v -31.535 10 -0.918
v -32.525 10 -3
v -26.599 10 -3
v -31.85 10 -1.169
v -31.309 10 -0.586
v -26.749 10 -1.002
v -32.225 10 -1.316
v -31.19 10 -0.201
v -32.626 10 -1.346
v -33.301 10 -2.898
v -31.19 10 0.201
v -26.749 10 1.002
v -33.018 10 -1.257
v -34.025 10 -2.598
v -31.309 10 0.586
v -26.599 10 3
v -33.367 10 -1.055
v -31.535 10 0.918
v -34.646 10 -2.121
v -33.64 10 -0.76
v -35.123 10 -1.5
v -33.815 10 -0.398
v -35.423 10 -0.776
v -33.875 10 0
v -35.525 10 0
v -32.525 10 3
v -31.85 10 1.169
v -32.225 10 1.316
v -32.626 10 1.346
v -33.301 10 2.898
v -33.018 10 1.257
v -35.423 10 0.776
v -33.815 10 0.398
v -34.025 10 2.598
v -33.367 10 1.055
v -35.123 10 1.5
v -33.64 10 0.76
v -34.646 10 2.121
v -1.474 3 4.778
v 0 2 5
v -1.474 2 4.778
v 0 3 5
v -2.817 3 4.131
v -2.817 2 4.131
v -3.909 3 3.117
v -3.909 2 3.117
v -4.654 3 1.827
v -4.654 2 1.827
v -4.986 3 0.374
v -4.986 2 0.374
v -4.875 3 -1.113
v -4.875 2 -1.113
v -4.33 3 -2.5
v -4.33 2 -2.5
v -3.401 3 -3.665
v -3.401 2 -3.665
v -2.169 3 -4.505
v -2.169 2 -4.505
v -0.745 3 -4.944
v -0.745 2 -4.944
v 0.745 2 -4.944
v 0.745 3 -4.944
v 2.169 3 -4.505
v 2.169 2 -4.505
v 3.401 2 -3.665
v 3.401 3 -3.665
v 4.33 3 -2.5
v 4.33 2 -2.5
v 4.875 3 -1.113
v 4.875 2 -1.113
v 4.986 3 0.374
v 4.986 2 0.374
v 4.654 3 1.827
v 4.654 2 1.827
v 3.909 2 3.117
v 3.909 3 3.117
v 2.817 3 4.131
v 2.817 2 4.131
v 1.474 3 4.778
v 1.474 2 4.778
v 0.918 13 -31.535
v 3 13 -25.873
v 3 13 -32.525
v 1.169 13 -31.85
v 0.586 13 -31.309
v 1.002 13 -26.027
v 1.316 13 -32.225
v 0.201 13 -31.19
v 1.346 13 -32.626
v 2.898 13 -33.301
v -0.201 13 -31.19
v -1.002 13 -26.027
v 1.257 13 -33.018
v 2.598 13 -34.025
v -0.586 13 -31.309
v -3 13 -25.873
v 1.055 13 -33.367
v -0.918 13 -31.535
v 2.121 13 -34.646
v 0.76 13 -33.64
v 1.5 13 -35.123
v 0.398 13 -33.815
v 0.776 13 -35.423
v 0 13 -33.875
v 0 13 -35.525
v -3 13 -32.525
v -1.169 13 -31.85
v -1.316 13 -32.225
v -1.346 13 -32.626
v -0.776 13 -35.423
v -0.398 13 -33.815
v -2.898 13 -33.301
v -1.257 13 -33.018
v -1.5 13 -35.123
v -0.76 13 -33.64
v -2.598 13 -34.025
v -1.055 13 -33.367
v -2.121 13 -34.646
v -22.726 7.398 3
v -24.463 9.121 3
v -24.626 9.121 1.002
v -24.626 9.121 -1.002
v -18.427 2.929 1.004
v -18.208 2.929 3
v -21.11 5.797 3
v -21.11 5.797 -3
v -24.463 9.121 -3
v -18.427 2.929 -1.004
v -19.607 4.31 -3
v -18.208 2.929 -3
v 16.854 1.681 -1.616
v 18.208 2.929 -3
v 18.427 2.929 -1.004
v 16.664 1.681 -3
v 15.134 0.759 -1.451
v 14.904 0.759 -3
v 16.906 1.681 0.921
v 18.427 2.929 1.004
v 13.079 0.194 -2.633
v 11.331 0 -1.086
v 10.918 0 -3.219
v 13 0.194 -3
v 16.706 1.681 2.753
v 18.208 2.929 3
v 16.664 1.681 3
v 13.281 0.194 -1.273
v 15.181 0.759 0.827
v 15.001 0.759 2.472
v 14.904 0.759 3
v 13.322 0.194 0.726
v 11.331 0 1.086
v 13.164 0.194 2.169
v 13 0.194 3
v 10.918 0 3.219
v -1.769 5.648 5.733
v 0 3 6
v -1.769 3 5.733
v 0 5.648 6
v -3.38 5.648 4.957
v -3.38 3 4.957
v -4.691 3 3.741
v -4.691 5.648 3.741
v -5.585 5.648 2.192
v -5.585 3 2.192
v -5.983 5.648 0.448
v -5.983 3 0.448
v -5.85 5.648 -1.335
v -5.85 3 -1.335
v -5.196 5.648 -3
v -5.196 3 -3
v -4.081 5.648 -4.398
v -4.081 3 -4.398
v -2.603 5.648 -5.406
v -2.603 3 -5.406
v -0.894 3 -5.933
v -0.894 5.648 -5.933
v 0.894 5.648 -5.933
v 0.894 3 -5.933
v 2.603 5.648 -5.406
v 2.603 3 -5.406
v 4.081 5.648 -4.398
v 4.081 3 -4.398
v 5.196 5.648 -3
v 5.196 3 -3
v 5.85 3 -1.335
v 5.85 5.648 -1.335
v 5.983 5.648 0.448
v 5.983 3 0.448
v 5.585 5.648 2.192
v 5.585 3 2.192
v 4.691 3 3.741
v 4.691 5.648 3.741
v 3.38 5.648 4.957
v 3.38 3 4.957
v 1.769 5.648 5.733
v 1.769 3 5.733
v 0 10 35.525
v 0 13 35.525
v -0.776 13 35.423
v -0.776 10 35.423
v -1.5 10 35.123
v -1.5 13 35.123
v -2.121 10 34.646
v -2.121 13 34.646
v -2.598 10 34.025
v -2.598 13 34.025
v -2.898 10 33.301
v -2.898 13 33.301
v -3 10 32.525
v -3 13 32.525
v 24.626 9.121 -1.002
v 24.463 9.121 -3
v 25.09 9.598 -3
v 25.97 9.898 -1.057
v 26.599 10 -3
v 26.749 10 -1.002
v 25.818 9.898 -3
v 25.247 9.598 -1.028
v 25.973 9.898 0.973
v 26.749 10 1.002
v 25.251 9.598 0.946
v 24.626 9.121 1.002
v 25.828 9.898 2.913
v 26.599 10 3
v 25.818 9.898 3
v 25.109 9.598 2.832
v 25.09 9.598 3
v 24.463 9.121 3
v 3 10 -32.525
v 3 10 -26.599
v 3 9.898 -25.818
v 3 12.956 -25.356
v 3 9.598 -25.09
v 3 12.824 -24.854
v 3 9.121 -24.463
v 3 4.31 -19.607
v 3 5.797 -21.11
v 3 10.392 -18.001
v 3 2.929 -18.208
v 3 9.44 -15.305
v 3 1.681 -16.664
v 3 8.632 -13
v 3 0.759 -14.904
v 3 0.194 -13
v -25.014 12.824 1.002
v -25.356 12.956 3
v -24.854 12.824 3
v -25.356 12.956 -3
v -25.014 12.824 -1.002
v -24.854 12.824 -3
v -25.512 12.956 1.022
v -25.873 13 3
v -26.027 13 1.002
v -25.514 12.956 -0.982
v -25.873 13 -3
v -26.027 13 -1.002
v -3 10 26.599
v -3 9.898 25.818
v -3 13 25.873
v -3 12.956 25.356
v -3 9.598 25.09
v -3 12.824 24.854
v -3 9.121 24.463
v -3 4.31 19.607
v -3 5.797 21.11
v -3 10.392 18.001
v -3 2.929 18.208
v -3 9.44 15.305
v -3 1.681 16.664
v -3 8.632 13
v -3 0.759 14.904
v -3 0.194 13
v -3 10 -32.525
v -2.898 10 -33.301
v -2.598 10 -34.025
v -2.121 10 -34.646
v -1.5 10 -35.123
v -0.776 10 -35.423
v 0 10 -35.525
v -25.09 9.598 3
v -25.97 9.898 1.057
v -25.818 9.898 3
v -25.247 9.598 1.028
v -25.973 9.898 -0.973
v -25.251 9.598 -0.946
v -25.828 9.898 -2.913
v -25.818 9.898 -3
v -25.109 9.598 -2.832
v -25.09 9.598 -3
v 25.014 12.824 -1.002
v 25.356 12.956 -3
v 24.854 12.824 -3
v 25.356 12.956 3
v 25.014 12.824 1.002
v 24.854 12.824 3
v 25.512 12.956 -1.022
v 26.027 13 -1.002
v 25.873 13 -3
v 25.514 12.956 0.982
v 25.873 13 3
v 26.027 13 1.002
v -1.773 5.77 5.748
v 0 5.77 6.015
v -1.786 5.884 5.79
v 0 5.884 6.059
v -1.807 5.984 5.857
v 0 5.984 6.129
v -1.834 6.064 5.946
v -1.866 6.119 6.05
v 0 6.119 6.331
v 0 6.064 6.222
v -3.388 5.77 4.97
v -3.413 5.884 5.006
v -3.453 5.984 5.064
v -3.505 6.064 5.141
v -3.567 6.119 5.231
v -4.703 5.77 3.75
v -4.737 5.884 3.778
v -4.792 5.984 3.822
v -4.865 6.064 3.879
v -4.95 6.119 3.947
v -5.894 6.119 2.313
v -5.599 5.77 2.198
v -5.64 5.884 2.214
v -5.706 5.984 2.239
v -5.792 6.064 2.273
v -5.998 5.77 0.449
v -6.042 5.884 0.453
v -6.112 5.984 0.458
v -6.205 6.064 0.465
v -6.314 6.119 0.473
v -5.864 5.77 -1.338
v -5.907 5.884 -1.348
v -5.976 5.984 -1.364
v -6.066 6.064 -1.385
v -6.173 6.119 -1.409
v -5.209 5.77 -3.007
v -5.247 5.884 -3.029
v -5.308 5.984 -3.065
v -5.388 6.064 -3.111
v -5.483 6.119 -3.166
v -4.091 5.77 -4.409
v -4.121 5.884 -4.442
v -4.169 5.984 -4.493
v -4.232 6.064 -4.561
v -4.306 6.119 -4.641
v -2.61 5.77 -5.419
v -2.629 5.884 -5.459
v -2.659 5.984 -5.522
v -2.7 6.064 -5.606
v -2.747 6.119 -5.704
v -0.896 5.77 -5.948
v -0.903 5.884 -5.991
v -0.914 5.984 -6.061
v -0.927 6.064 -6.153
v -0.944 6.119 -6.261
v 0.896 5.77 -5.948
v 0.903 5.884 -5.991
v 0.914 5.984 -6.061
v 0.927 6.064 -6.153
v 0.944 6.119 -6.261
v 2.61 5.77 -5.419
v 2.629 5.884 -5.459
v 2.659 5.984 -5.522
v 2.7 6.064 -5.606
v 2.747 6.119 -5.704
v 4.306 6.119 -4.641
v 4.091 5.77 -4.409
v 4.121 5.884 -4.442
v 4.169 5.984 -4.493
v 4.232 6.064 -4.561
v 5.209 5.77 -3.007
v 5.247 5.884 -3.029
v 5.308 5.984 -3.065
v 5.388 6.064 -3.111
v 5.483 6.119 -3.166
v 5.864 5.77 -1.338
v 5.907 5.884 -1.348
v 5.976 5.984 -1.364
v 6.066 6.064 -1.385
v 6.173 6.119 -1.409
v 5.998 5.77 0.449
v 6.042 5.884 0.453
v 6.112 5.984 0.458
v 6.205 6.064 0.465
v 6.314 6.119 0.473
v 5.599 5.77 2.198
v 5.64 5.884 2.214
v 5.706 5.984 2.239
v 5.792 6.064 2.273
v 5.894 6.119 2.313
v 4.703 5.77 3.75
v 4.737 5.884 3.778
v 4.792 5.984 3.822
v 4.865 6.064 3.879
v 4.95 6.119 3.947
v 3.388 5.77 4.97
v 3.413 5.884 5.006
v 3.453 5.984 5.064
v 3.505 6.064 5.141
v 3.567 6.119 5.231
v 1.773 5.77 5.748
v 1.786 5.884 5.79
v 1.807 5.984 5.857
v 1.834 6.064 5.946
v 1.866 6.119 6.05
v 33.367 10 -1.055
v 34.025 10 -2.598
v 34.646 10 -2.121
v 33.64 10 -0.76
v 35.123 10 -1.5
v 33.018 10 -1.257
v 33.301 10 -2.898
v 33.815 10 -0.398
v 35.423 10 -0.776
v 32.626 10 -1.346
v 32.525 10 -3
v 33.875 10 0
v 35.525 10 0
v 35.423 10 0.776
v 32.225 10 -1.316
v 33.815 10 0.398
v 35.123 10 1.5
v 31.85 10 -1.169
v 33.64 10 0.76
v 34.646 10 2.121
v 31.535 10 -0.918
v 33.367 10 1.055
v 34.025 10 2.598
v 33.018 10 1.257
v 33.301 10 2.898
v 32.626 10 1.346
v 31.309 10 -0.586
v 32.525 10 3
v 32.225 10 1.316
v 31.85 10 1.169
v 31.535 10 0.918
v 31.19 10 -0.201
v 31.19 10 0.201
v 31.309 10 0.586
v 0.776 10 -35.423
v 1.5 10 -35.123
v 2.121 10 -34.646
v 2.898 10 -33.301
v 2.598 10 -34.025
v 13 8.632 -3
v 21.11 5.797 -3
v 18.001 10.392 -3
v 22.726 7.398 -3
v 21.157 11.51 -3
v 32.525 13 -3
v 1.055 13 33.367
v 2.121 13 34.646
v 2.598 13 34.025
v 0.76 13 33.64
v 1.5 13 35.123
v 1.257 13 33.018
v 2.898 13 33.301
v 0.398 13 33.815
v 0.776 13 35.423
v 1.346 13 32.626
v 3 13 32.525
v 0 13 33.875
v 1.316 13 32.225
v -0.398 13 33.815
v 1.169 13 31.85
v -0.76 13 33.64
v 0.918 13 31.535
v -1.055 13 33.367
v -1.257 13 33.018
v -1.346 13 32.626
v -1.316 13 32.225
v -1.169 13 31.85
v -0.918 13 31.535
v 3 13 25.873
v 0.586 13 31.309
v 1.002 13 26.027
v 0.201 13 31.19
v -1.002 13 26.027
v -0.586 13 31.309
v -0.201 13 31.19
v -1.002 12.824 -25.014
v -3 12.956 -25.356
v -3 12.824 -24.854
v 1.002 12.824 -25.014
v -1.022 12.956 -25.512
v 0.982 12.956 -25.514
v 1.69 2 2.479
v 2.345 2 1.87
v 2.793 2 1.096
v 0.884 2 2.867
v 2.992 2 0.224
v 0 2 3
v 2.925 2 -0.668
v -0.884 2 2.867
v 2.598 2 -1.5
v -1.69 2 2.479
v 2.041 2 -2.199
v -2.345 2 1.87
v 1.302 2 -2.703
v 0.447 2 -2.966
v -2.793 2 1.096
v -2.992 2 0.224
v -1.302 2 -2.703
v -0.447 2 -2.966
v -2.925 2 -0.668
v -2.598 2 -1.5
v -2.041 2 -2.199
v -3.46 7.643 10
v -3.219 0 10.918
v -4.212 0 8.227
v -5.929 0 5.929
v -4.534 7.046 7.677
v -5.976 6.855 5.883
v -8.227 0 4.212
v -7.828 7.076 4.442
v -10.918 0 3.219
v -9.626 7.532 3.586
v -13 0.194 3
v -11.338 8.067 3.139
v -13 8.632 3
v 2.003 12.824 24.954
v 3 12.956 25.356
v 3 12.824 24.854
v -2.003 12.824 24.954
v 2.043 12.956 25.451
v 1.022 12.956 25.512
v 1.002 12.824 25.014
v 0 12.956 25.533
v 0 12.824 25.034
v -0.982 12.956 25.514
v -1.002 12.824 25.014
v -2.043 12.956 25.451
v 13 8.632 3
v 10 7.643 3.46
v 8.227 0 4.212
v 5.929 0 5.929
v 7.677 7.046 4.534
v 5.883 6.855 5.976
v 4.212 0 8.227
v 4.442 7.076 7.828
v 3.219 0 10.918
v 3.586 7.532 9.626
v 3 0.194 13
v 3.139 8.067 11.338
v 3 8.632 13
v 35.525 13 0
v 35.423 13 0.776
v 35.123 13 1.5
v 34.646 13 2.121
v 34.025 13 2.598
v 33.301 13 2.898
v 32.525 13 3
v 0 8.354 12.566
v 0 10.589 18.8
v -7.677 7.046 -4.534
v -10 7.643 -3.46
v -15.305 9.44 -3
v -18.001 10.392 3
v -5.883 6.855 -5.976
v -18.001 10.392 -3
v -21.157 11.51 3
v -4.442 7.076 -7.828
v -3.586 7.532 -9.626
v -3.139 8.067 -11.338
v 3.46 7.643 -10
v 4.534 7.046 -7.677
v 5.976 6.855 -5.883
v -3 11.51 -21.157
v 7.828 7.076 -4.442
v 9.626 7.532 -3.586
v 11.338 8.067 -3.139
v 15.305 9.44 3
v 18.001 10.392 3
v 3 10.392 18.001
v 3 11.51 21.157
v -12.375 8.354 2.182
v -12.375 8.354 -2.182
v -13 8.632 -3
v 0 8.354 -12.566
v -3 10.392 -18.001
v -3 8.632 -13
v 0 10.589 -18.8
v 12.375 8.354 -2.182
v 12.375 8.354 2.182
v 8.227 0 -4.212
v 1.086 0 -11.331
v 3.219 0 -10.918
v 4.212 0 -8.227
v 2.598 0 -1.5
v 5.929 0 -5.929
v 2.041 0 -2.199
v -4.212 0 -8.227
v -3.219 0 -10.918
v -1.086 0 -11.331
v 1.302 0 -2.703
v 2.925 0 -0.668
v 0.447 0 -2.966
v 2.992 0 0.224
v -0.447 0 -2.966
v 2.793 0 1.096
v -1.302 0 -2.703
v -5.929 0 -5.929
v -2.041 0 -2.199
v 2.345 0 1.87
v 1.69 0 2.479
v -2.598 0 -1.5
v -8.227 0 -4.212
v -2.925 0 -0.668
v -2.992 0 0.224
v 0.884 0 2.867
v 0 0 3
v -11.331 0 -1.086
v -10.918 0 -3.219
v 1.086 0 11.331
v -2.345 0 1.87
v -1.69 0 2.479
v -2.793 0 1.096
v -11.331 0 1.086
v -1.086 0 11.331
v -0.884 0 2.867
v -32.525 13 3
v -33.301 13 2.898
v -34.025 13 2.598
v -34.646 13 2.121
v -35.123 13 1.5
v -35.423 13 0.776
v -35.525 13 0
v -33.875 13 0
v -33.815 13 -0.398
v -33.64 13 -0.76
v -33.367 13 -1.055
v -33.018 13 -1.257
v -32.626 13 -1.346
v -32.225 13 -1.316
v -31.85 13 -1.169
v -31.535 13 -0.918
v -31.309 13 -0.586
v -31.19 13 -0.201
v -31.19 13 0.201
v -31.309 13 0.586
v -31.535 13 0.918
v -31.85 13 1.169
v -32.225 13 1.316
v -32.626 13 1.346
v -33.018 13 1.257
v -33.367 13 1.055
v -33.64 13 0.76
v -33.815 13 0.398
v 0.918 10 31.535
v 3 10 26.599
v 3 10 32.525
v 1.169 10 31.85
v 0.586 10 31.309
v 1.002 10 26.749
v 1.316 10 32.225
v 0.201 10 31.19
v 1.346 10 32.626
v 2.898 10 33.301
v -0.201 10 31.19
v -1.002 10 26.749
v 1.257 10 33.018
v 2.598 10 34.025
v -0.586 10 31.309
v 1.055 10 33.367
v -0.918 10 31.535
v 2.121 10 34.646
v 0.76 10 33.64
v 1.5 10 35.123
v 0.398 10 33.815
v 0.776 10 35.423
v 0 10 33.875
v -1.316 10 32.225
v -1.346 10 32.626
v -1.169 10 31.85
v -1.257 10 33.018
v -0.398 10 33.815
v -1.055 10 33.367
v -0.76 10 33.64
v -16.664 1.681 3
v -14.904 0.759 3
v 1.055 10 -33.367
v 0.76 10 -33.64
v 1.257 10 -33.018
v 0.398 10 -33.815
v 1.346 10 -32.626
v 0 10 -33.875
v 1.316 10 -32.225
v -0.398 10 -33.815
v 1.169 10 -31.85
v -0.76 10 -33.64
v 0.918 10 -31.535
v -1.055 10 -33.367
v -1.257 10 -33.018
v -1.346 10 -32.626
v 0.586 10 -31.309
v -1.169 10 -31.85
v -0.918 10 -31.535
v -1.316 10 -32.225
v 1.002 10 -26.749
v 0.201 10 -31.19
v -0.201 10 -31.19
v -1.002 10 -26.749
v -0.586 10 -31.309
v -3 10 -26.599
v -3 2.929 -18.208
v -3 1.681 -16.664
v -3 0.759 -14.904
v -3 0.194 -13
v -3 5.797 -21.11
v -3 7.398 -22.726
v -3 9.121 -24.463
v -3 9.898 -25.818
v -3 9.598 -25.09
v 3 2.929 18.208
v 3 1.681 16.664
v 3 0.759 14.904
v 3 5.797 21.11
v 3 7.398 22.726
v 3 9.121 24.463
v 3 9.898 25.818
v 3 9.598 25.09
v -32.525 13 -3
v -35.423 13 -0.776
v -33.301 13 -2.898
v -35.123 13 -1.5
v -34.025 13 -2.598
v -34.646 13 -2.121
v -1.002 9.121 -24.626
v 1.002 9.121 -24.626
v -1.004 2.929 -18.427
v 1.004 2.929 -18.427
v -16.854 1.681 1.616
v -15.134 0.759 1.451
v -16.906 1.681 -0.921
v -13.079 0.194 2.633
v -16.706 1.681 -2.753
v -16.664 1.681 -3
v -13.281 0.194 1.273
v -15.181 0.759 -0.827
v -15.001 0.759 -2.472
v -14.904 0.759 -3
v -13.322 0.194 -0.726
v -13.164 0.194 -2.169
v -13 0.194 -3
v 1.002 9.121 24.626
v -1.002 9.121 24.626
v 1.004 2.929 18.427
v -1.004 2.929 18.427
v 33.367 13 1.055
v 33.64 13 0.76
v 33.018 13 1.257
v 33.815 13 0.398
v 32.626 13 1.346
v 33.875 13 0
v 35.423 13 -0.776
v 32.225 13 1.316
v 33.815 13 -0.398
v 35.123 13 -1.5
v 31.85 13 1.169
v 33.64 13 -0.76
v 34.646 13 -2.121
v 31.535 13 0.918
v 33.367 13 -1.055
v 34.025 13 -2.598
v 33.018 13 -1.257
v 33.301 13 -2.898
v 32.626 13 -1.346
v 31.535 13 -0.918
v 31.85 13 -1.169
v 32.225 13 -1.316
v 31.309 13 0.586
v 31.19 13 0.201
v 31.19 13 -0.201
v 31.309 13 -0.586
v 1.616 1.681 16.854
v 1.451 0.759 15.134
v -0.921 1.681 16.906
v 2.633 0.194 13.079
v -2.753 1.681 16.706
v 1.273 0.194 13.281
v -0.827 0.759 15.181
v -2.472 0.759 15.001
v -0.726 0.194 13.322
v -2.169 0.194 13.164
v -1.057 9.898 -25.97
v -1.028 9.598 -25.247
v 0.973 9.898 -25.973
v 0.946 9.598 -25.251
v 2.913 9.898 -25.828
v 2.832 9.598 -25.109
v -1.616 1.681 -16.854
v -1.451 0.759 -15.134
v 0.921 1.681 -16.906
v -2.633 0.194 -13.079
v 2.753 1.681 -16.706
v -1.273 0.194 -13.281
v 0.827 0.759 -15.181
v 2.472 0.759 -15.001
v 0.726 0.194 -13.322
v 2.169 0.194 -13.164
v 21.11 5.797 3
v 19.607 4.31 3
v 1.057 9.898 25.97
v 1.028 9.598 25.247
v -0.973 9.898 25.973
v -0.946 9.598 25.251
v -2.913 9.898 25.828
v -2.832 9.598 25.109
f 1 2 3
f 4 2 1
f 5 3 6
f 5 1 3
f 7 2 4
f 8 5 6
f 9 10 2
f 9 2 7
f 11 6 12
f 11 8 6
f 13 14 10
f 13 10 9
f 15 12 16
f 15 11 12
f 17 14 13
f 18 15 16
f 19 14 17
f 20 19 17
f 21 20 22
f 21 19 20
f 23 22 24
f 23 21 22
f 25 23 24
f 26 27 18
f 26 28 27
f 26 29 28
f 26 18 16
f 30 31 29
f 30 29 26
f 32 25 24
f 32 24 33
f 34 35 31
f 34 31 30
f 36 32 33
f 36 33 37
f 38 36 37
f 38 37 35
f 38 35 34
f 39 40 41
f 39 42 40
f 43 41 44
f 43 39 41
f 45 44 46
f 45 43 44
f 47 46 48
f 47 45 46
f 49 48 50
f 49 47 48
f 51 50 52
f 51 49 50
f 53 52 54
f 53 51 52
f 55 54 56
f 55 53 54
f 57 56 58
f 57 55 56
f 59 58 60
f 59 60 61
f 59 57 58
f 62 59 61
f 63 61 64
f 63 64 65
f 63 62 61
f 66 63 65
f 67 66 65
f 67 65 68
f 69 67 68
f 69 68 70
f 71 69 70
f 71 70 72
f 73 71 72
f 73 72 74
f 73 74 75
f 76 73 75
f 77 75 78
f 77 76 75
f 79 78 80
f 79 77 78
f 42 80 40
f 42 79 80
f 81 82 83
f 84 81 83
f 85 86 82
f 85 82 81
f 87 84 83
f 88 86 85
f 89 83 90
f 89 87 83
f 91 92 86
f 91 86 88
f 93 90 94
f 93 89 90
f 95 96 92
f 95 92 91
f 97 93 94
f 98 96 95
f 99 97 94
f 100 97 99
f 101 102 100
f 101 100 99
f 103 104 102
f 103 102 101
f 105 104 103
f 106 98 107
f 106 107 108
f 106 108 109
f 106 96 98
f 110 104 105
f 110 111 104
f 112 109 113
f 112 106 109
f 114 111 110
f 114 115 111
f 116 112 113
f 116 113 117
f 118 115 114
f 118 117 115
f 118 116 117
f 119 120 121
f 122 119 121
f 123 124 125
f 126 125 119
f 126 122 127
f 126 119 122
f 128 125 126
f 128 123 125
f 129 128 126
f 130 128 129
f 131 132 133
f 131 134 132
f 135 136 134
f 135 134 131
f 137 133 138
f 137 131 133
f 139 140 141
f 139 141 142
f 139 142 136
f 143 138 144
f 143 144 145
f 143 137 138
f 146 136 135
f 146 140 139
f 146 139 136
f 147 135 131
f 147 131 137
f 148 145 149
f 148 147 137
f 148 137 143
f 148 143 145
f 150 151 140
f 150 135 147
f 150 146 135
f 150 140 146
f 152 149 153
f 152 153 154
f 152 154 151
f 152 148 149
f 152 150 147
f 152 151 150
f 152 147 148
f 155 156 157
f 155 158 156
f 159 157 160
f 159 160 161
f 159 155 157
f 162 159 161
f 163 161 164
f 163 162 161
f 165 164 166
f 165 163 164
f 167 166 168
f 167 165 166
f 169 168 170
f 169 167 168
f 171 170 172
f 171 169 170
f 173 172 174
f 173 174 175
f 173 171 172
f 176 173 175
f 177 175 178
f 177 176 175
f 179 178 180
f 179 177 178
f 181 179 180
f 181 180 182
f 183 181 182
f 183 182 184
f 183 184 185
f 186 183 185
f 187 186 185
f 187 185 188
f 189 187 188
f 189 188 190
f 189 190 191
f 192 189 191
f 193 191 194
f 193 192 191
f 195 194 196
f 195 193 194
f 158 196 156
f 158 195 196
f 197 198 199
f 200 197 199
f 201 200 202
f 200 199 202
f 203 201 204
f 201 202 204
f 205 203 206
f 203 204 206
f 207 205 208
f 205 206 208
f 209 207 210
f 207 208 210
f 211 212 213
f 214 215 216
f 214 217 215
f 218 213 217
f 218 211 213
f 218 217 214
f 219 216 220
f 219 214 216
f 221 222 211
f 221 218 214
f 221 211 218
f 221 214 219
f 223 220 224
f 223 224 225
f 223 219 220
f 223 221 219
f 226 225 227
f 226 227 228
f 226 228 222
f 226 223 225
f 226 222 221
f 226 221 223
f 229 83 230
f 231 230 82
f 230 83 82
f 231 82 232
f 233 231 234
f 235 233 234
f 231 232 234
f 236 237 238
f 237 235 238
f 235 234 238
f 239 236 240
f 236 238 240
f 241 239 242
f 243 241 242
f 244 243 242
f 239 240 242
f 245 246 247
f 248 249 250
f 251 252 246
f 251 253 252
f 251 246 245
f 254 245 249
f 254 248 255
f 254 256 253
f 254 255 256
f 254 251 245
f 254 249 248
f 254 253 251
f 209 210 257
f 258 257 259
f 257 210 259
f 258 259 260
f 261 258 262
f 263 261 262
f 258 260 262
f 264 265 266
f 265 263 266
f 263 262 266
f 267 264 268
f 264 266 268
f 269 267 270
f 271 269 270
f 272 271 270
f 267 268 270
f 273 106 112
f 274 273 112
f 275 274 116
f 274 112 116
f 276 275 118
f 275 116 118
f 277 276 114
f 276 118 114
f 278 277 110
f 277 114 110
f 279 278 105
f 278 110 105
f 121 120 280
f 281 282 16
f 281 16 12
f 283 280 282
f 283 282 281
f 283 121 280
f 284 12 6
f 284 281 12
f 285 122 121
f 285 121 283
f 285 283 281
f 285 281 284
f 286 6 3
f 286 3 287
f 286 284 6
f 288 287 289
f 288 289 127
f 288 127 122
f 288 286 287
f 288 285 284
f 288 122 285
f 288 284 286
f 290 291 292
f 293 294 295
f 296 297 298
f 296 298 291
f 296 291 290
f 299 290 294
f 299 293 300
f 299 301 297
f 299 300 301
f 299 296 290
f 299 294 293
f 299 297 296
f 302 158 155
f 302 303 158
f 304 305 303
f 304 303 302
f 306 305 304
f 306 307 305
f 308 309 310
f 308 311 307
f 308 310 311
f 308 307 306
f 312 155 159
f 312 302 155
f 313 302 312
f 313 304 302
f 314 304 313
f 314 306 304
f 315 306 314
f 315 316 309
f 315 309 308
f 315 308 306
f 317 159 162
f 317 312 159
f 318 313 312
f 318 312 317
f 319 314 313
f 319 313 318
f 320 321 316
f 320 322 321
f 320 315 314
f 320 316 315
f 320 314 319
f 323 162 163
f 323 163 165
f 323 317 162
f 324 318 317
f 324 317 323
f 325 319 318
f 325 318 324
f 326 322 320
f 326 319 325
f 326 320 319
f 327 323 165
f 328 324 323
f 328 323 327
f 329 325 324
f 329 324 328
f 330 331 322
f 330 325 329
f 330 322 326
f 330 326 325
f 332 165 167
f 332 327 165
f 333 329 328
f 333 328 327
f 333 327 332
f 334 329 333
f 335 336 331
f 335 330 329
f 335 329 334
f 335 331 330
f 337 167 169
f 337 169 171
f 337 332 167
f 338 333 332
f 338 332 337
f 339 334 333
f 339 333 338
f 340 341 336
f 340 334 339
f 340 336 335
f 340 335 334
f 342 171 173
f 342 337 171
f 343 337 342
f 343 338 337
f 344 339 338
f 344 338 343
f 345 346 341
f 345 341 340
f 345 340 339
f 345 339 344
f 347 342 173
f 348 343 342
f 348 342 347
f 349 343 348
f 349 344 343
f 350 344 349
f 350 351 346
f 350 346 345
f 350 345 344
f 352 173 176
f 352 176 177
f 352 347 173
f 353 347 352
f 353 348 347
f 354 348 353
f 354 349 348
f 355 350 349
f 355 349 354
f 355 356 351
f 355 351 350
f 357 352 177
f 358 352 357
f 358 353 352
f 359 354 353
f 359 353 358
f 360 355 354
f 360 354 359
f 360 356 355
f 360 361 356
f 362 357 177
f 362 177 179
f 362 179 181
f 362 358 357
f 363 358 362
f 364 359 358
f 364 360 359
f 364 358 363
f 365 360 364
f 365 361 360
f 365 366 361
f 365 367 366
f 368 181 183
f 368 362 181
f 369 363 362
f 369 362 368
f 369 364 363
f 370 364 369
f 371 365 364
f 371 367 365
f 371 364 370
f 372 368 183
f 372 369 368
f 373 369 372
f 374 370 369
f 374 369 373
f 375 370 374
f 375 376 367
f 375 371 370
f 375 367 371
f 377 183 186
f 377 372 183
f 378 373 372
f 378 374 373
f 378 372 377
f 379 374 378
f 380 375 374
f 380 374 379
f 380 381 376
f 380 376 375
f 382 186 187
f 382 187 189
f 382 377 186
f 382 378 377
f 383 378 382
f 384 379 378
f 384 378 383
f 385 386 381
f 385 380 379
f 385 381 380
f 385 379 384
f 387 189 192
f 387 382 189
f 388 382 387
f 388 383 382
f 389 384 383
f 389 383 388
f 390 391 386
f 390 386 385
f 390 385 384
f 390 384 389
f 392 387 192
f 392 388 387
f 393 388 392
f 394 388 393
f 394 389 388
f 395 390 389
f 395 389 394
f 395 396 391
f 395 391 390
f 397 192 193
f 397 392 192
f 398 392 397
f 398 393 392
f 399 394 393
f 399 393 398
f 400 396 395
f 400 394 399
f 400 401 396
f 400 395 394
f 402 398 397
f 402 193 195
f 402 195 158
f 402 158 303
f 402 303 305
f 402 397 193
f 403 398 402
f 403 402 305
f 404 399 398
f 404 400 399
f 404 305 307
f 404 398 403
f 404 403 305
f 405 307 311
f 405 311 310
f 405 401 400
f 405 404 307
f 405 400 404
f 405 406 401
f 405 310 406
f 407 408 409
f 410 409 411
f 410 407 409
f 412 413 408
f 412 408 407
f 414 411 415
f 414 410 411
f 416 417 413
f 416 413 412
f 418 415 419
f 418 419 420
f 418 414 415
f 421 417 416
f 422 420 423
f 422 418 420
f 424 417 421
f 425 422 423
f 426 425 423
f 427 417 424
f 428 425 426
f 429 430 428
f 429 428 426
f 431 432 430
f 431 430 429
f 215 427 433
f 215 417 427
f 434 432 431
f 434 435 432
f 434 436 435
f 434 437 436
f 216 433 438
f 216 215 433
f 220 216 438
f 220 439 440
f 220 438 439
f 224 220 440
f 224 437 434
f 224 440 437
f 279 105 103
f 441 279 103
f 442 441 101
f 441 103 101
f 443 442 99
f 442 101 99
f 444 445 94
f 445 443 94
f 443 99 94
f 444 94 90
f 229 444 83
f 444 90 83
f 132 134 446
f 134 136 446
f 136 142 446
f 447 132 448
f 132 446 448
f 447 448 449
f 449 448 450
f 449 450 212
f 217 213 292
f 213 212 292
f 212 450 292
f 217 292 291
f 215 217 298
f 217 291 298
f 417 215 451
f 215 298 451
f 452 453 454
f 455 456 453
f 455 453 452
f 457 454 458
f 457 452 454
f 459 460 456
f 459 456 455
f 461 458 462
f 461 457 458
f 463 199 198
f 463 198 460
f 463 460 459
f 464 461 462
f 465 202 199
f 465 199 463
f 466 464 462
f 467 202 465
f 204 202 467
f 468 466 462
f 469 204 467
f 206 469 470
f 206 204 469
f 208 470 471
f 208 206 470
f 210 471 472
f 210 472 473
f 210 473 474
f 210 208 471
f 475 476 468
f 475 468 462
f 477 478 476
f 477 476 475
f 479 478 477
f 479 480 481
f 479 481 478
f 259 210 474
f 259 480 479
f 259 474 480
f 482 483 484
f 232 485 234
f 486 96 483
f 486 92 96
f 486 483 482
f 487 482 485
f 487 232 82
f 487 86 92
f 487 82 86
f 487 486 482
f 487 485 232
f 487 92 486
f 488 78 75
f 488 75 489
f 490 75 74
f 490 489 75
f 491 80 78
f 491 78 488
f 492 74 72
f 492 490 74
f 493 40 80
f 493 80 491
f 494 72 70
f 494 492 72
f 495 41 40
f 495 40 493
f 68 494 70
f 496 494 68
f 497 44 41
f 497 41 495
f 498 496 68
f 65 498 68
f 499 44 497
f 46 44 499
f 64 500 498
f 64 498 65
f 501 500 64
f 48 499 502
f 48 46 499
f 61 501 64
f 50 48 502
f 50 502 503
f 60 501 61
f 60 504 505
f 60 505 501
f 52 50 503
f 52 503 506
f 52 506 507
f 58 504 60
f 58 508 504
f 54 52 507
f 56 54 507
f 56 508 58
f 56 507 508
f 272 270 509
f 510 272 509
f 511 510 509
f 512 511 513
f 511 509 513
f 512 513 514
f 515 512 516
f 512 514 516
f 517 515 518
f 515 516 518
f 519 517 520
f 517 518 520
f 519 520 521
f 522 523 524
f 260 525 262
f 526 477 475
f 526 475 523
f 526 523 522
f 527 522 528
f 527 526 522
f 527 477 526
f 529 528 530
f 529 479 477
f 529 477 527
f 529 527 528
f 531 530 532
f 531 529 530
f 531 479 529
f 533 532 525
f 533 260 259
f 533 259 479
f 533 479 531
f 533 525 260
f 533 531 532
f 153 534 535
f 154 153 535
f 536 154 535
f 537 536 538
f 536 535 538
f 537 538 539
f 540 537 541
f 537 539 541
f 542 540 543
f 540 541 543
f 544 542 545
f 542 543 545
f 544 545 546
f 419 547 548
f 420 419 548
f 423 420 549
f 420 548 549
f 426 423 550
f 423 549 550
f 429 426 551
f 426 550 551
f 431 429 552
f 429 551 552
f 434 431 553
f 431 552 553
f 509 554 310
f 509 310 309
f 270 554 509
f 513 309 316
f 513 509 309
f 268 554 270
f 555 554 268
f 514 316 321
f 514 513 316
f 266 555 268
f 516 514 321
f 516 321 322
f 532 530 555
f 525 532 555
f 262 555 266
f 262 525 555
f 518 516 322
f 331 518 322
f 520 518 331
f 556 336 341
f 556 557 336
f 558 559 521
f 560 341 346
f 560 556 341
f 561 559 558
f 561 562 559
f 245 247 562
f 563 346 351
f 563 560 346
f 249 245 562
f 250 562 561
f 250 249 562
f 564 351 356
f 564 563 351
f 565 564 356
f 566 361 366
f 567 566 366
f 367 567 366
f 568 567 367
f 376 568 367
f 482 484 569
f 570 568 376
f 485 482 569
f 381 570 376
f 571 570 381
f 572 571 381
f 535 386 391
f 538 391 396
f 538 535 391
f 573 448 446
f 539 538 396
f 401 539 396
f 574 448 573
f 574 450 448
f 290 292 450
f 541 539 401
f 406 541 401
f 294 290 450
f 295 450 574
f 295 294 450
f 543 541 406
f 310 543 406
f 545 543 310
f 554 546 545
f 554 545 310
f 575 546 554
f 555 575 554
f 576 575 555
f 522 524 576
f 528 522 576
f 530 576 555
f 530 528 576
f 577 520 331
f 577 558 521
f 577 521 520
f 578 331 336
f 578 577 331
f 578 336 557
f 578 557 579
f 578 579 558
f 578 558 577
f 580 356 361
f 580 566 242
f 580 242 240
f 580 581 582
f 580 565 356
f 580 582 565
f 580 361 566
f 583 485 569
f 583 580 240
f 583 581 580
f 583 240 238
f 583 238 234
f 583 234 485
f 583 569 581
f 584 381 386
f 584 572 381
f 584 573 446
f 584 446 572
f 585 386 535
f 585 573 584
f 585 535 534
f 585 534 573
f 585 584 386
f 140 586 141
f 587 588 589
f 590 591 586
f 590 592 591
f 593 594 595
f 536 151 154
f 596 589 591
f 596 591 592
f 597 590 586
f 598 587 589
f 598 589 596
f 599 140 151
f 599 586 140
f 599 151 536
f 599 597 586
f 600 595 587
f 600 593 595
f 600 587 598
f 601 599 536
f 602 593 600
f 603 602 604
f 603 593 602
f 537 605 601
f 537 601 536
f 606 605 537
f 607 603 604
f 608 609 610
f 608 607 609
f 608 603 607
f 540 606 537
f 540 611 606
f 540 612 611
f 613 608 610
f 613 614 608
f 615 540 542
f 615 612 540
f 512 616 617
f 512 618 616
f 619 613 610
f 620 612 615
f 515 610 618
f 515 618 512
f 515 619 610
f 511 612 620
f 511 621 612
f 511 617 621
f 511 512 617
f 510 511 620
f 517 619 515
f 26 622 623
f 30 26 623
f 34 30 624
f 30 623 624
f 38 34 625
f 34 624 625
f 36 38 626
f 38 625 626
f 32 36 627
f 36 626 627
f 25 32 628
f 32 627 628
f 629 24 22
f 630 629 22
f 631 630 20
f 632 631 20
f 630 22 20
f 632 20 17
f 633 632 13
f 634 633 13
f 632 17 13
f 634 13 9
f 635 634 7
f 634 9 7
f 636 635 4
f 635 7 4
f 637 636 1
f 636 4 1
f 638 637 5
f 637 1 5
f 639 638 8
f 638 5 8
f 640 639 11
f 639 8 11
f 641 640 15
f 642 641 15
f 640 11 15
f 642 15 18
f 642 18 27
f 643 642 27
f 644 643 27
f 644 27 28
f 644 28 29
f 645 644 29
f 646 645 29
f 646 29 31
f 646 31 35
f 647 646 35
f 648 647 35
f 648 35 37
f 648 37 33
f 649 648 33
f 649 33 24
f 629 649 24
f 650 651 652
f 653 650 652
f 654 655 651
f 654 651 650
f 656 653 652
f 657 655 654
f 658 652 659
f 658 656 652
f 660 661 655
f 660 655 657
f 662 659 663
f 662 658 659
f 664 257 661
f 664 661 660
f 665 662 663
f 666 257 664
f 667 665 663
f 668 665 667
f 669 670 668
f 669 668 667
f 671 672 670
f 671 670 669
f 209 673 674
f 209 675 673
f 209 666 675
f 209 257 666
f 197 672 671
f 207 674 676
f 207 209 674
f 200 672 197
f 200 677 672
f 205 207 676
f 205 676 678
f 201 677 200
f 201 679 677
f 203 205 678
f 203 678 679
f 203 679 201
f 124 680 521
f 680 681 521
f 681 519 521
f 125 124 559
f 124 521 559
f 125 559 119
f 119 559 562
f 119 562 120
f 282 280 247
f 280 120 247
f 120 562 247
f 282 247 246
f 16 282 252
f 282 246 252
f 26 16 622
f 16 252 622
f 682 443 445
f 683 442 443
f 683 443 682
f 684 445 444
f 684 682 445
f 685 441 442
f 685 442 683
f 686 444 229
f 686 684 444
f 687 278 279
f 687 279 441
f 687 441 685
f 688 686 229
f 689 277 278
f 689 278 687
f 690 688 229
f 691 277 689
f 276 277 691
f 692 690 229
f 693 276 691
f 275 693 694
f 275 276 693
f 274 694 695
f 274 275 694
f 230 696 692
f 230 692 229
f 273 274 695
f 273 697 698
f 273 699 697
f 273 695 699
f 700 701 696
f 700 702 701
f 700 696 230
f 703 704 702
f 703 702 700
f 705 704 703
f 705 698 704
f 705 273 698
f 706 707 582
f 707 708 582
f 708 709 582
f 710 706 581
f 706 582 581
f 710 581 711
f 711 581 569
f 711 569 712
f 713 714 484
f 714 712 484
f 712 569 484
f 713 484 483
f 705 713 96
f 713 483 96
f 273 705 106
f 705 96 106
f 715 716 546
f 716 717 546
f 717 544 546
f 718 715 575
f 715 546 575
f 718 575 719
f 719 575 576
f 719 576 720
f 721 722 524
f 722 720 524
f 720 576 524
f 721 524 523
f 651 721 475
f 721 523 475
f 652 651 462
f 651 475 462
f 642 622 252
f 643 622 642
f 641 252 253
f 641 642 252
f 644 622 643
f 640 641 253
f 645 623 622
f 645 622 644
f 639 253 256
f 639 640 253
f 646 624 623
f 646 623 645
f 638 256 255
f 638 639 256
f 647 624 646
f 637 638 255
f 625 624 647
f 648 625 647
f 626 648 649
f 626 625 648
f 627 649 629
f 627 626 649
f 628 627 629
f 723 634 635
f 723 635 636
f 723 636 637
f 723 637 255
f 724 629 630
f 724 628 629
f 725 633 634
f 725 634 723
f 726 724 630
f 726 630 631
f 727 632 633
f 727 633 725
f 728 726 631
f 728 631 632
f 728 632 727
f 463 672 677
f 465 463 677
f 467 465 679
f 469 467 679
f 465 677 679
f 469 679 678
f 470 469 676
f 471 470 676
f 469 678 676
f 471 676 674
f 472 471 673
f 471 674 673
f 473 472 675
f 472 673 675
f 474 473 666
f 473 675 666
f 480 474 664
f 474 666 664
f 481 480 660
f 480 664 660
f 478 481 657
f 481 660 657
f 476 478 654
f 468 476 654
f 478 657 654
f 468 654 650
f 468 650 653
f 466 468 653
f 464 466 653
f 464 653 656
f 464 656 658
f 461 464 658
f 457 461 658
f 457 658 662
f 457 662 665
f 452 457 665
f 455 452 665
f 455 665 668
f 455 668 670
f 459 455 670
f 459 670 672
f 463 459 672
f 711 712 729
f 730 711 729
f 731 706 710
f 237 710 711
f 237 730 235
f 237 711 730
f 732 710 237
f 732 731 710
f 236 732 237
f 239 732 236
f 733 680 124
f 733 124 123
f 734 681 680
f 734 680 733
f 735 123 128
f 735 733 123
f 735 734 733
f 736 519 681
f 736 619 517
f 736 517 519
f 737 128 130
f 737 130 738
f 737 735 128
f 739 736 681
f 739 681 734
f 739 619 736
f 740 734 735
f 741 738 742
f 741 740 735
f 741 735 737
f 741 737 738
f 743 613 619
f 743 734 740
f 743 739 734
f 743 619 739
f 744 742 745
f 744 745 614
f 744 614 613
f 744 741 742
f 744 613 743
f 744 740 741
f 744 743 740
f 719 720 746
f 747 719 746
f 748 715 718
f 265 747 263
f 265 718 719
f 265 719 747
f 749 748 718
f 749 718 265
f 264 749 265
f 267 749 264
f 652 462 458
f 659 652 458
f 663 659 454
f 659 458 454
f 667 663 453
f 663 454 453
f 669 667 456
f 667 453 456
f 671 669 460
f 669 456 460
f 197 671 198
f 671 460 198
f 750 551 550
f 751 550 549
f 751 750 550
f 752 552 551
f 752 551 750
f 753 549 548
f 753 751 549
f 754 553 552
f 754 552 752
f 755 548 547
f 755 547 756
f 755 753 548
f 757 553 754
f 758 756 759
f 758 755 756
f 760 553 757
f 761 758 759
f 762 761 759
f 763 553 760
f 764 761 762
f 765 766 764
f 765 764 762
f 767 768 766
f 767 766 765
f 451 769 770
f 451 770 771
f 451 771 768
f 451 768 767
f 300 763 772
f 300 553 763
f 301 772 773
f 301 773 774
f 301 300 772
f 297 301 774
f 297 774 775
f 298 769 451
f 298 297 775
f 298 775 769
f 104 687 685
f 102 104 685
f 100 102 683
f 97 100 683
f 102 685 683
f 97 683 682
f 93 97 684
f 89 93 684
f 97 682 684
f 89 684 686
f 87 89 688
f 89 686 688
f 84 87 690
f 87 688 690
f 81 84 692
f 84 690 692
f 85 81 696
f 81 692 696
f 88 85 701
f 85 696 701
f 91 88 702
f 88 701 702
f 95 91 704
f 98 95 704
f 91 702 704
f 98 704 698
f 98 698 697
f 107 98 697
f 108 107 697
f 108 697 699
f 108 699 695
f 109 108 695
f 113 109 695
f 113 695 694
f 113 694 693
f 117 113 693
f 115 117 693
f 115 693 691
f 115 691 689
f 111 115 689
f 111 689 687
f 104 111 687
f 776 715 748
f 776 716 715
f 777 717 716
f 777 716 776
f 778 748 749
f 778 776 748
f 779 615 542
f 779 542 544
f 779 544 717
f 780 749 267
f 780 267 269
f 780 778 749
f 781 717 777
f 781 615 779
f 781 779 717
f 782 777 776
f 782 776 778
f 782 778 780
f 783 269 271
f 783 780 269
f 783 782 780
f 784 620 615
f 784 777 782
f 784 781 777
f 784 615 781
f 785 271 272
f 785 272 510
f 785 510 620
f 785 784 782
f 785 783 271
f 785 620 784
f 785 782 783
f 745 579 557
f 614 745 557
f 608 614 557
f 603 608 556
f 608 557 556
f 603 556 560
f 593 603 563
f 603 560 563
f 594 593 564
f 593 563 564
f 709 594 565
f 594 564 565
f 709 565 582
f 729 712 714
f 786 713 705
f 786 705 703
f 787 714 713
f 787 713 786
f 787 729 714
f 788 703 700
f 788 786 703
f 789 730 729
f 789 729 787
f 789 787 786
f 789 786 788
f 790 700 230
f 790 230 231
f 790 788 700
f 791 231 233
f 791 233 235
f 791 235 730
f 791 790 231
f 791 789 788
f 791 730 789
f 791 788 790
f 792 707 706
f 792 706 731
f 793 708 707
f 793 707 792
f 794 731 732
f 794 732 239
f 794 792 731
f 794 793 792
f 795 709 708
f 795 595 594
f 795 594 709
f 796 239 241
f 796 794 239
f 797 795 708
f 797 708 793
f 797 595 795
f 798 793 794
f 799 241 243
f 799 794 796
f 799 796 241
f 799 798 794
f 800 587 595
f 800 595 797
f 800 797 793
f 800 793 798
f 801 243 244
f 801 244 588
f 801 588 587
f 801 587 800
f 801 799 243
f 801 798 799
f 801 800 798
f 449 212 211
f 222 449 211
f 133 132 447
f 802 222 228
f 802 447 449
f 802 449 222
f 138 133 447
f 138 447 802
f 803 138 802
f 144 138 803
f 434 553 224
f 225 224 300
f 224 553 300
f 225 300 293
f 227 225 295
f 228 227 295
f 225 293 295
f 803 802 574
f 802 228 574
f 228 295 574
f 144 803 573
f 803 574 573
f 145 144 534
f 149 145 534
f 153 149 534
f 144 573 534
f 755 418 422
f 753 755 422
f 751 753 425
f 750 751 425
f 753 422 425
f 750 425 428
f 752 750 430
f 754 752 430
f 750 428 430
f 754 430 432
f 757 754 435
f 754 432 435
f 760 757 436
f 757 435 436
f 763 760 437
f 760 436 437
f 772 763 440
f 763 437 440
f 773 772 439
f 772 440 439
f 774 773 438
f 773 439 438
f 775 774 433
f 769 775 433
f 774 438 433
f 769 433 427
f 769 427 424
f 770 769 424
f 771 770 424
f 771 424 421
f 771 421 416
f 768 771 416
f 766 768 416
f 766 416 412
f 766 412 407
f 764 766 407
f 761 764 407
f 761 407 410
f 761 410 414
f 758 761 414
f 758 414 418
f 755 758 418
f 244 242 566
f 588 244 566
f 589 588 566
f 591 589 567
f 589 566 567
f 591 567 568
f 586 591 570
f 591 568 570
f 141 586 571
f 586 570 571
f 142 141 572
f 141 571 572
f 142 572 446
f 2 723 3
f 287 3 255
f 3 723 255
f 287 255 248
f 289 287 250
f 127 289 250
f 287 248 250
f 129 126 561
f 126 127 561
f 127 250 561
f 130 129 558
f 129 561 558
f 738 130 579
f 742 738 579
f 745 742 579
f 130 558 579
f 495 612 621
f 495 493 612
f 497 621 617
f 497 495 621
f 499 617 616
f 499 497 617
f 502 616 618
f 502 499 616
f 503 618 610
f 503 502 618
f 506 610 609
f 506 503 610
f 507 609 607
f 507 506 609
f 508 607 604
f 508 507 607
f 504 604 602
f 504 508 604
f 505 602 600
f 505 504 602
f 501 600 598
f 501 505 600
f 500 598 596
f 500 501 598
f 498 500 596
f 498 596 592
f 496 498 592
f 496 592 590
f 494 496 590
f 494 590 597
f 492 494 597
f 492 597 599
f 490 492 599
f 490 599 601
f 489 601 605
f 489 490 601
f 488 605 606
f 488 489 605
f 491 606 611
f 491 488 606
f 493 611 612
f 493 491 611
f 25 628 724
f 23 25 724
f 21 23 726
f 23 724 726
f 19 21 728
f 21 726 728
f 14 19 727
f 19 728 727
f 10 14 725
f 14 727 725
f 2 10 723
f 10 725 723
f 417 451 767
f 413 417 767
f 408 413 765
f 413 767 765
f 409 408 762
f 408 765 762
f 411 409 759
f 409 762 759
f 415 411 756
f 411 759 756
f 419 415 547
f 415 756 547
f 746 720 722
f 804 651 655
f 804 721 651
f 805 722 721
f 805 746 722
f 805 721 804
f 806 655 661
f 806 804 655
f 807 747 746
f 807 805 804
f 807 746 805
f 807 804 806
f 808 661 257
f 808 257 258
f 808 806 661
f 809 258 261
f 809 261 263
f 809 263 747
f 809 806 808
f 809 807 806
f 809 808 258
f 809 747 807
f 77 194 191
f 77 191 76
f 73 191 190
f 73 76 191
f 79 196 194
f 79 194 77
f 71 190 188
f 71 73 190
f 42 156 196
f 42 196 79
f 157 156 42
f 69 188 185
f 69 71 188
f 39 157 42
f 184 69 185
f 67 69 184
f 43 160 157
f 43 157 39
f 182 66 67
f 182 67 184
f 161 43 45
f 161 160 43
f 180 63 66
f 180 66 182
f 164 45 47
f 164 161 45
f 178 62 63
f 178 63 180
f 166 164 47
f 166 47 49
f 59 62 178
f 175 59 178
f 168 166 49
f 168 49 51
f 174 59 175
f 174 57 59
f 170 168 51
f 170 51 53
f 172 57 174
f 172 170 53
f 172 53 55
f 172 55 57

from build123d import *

# Parameters (mm, degrees)
D_GAGEMENT_M2_51_D           = 2.7
R_P_TITION_CIRCULAIRE1_COUNT = 4
ENL_V_MAT_EXTRU_1_DEPTH      = 52.894616773


with BuildPart() as part:
    # Esquisse1 → Révolution1 (revolve)
    with BuildSketch(Plane.XY, mode=Mode.PRIVATE) as r_volution1_sk:
        with BuildLine():
            Line((-11.382864376, 0), (-3, 0))
            Line((-3, 0), (-3, 2))
            Line((-3, 2), (-5, 2))
            Line((-5, 2), (-5, 3))
            Line((-5, 3), (-6, 3))
            Line((-6, 3), (-6, 5.648095238))
            ThreePointArc((-6, 5.648095238), (-6.091117155, 5.935870879), (-6.331259276, 6.118761328))
            Line((-6.331259276, 6.118761328), (-25.034076062, 12.823996539))
            ThreePointArc((-25.034076062, 12.823996539), (-25.532706049, 12.955671634), (-26.046520404, 13))
            Line((-26.046520404, 13), (-35.525, 13))
            Line((-35.525, 13), (-35.525, 10))
            Line((-35.525, 10), (-26.767640687, 10))
            ThreePointArc((-26.767640687, 10), (-25.61959039, 9.771638598), (-24.646320344, 9.121320344))
            Line((-24.646320344, 9.121320344), (-18.453932188, 2.928932188))
            ThreePointArc((-18.453932188, 2.928932188), (-15.2096987, 0.761204675), (-11.382864376, 0))
        make_face()
    revolve(r_volution1_sk.sketch.rotate(Axis((0, 5.07757265, 0), (0, -1, 0)), 270), axis=Axis((0, 5.07757265, 0), (0, -1, 0)))

    # Dégagement M2.51 (through all)
    with Locations(Plane(origin=(0, 13, 0), x_dir=(1, 0, 0), z_dir=(0, 1, 0))):
        with Locations((-32.525, 0)):
            d_gagement_m2_51 = Hole(D_GAGEMENT_M2_51_D / 2)

    # Répétition circulaire1: Dégagement M2.51 ×4 about axis
    r_p_tition_circulaire1_axis = Axis((0, 0, 0), (0, 1, 0))
    for i in range(1, R_P_TITION_CIRCULAIRE1_COUNT):
        add(d_gagement_m2_51.rotate(r_p_tition_circulaire1_axis, i * 360 / R_P_TITION_CIRCULAIRE1_COUNT), mode=Mode.SUBTRACT)

    # Esquisse4 → Enlèv. mat.-Extru.1 (cut, through all)
    with BuildSketch(Plane(origin=(0, 13, 0), x_dir=(1, 0, 0), z_dir=(0, 1, 0))):
        with BuildLine():
            ThreePointArc((3e-09, 35.525), (2.121320345, 34.646320343), (3, 32.525))
            Line((3, 32.525), (3, 13))
            ThreePointArc((3, 13), (5.928932188, 5.928932188), (13, 3))
            Line((13, 3), (32.525, 3))
            ThreePointArc((32.525, 3), (34.646320344, 2.121320344), (35.525, 0))
            ThreePointArc((35.525, 0), (25.119968403, 25.119968401), (3e-09, 35.525))
        make_face()
        with BuildLine():
            ThreePointArc((-3, 32.525), (-2.121320343, 34.646320345), (3e-09, 35.525))
            ThreePointArc((3e-09, 35.525), (-25.119968401, 25.119968403), (-35.525, 0))
            ThreePointArc((-35.525, 0), (-34.646320344, 2.121320344), (-32.525, 3))
            Line((-32.525, 3), (-13, 3))
            ThreePointArc((-13, 3), (-5.928932188, 5.928932188), (-3, 13))
            Line((-3, 13), (-3, 32.525))
        make_face()
        with BuildLine():
            ThreePointArc((0, -35.525), (25.119968402, -25.119968402), (35.525, 0))
            ThreePointArc((35.525, 0), (34.646320344, -2.121320344), (32.525, -3))
            Line((32.525, -3), (13, -3))
            ThreePointArc((13, -3), (5.928932188, -5.928932188), (3, -13))
            Line((3, -13), (3, -32.525))
            ThreePointArc((3, -32.525), (2.121320344, -34.646320344), (0, -35.525))
        make_face()
        with BuildLine():
            ThreePointArc((-32.525, -3), (-34.646320344, -2.121320344), (-35.525, 0))
            ThreePointArc((-35.525, 0), (-25.119968402, -25.119968402), (0, -35.525))
            ThreePointArc((0, -35.525), (-2.121320344, -34.646320344), (-3, -32.525))
            Line((-3, -32.525), (-3, -13))
            ThreePointArc((-3, -13), (-5.928932188, -5.928932188), (-13, -3))
            Line((-13, -3), (-32.525, -3))
        make_face()
    extrude(amount=-ENL_V_MAT_EXTRU_1_DEPTH, mode=Mode.SUBTRACT)


solid = part.part
